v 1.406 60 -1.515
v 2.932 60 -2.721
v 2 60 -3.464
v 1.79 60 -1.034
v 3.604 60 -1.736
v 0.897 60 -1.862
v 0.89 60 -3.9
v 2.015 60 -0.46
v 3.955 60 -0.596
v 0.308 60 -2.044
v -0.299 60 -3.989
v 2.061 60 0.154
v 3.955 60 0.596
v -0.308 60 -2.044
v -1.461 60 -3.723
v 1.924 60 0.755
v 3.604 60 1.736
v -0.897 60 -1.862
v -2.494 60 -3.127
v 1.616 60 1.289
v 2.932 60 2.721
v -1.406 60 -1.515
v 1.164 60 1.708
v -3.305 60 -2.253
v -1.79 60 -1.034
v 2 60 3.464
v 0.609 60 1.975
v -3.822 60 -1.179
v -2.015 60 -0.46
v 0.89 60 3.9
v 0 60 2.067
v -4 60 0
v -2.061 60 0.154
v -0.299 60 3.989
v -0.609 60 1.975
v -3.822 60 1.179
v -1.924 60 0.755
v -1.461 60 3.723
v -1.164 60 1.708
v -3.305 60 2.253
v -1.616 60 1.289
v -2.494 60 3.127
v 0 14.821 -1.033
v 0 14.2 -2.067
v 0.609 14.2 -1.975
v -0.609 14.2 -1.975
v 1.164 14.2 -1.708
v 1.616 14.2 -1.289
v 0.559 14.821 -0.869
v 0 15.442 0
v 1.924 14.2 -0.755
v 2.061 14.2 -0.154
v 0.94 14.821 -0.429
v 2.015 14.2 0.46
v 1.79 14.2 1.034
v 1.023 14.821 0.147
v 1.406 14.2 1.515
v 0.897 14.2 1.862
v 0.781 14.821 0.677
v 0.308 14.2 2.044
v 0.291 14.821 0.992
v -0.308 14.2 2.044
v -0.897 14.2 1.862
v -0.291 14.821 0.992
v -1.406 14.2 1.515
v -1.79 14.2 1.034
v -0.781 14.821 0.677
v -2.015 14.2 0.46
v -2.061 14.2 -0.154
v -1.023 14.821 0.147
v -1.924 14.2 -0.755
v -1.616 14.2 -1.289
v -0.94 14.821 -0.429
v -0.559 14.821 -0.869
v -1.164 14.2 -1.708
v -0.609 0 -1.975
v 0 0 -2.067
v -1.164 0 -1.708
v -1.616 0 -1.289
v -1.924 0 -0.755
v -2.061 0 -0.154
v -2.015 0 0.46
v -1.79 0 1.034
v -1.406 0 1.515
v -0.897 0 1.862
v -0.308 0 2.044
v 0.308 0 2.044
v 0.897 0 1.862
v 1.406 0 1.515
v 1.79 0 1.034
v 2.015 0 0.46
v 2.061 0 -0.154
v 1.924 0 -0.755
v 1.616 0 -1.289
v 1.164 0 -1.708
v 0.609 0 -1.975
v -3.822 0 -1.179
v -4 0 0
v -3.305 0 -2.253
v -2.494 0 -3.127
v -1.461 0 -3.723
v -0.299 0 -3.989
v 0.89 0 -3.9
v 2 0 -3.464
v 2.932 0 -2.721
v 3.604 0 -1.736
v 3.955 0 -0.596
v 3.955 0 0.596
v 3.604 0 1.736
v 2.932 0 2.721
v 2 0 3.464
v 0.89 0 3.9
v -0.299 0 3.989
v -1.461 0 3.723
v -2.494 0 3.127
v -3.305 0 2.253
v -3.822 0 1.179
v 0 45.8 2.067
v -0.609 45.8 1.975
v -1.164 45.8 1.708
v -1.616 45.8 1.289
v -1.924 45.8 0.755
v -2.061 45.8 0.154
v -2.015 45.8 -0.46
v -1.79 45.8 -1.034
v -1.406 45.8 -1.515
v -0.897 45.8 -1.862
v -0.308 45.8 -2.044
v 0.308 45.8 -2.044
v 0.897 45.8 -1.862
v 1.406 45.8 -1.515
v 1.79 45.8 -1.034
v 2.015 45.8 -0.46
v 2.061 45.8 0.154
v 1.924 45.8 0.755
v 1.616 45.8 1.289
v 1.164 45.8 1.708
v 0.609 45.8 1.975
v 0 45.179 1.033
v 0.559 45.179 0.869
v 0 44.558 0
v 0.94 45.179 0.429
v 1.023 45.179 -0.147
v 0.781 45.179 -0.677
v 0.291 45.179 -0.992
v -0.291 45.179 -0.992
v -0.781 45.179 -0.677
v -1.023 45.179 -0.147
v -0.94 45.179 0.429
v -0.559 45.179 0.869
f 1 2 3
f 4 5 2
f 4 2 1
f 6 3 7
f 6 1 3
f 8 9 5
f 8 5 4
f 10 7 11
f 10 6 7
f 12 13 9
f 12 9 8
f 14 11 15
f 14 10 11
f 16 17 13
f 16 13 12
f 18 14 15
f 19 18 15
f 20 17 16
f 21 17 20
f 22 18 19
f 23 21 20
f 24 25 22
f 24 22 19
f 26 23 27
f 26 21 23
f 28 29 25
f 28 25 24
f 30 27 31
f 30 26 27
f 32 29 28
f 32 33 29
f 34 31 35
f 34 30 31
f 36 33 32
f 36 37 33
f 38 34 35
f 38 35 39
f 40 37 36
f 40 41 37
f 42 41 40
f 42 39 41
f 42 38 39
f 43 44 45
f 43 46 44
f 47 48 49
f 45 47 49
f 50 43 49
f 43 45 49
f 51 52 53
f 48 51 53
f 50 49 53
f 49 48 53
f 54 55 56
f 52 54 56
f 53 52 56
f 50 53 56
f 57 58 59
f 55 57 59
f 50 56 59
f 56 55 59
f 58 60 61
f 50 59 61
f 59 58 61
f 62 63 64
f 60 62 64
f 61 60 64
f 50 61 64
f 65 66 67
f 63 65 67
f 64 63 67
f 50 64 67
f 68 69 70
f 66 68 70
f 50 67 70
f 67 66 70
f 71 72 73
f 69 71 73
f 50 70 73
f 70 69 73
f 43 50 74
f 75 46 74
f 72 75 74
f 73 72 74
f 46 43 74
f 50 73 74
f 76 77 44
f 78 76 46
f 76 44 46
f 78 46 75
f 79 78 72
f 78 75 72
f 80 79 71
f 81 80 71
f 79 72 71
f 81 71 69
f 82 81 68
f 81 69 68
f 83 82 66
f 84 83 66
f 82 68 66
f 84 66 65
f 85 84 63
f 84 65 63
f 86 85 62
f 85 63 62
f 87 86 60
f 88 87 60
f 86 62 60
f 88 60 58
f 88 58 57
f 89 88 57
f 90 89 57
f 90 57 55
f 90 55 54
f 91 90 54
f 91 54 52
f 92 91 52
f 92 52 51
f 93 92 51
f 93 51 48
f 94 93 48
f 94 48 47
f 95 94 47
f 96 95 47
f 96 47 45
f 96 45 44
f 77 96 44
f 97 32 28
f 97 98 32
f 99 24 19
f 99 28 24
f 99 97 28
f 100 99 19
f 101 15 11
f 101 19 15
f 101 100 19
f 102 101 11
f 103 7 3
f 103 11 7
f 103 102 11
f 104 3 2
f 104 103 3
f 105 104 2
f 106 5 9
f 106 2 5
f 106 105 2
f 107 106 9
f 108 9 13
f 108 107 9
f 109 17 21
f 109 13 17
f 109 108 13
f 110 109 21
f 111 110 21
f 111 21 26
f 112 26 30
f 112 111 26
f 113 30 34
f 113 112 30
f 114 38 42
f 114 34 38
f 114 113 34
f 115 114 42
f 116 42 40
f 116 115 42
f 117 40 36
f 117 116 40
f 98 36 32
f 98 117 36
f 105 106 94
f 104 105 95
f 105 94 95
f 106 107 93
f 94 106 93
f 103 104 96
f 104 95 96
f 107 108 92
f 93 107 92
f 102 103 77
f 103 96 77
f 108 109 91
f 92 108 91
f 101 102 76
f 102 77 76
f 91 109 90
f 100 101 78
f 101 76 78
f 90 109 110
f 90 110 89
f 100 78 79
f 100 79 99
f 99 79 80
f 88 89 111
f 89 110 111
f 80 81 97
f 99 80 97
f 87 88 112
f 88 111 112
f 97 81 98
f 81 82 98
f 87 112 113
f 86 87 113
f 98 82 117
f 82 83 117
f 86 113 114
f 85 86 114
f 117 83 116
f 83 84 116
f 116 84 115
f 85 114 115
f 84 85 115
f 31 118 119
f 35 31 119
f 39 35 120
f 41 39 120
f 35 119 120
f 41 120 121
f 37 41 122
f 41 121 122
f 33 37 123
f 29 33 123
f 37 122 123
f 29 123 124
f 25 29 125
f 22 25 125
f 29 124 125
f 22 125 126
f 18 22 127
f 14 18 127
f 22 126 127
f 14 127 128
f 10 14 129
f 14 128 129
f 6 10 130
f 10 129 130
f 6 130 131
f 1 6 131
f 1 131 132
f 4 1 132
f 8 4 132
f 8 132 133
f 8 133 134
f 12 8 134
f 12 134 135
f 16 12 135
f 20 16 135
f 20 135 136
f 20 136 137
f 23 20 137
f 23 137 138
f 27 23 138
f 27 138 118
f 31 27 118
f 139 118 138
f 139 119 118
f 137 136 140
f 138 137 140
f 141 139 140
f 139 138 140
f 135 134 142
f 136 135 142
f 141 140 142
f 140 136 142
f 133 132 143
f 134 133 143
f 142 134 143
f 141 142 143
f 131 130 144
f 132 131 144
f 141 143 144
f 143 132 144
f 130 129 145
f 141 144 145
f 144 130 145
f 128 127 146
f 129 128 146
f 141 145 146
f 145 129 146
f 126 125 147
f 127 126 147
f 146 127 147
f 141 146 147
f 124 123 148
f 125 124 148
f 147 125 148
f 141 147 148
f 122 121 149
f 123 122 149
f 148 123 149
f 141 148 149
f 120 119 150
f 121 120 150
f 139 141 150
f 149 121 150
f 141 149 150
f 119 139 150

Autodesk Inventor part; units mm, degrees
ref_plane "YZ Plane" through (0, 0, 0) normal (1, 0, 0) x (0, 1, 0)
ref_plane "XZ Plane" through (0, 0, 0) normal (0, 1, 0) x (-1, 0, 0)
ref_plane "XY Plane" through (0, 0, 0) normal (0, 0, 1) x (1, 0, 0)
sketch "Esboço1" plane through (0, 0, 0) normal (0, 1, 0) x (-1, 0, 0)
  circle A0 centre (0, 0) radius 4
  dimension "d1" = 8
extrude "Extrusão1" add sketch "Esboço1" along normal blind 60
sketch "Esboço4" plane through (0, 60, 0) normal (0, 1, 0) x (1, 0, 0)
  circle A0 centre (0, 0) radius 4 projected
hole "Furo1" at (0, 60, 0) direction (0, -1, 0) diameter 4.134 depth 14.2 tip angle 118 thread size "M5x0.8" class "6H" standard "ISO Metric profile"
sketch "Esboço5" plane through (0, 0, 0) normal (0, -1, 0) x (1, 0, 0)
  circle A0 centre (0, 0) radius 4 projected
hole "Furo2" at (0, 0, 0) direction (0, 1, 0) diameter 4.134 depth 14.2 tip angle 118 thread size "M5x0.8" class "6H" standard "ISO Metric profile"
equation "\"Raio_vergadura\" = Espessura"
equation "\"Largura_alívio_de_vergadura\" = Espessura"
equation "\"Profundidade_alívio_de_vergadura\" = 0.5 * Espessura"
equation "\"Tamanho_alívio_de_dobra\" = 4 * Espessura"
equation "\"Remanescente_mínimo\" = 2 * Espessura"
equation "\"Raiodetransição\" = Raio_vergadura"
equation "\"Tamanho_de_raio_de_Jacobi\" = Raio_vergadura"
equation "\"TamanhoFolga\" = Espessura"
equation "\"Espessura\" = 0.5"
properties part number "Suporte da base de apoio" material "Latão, amarelo macio"
